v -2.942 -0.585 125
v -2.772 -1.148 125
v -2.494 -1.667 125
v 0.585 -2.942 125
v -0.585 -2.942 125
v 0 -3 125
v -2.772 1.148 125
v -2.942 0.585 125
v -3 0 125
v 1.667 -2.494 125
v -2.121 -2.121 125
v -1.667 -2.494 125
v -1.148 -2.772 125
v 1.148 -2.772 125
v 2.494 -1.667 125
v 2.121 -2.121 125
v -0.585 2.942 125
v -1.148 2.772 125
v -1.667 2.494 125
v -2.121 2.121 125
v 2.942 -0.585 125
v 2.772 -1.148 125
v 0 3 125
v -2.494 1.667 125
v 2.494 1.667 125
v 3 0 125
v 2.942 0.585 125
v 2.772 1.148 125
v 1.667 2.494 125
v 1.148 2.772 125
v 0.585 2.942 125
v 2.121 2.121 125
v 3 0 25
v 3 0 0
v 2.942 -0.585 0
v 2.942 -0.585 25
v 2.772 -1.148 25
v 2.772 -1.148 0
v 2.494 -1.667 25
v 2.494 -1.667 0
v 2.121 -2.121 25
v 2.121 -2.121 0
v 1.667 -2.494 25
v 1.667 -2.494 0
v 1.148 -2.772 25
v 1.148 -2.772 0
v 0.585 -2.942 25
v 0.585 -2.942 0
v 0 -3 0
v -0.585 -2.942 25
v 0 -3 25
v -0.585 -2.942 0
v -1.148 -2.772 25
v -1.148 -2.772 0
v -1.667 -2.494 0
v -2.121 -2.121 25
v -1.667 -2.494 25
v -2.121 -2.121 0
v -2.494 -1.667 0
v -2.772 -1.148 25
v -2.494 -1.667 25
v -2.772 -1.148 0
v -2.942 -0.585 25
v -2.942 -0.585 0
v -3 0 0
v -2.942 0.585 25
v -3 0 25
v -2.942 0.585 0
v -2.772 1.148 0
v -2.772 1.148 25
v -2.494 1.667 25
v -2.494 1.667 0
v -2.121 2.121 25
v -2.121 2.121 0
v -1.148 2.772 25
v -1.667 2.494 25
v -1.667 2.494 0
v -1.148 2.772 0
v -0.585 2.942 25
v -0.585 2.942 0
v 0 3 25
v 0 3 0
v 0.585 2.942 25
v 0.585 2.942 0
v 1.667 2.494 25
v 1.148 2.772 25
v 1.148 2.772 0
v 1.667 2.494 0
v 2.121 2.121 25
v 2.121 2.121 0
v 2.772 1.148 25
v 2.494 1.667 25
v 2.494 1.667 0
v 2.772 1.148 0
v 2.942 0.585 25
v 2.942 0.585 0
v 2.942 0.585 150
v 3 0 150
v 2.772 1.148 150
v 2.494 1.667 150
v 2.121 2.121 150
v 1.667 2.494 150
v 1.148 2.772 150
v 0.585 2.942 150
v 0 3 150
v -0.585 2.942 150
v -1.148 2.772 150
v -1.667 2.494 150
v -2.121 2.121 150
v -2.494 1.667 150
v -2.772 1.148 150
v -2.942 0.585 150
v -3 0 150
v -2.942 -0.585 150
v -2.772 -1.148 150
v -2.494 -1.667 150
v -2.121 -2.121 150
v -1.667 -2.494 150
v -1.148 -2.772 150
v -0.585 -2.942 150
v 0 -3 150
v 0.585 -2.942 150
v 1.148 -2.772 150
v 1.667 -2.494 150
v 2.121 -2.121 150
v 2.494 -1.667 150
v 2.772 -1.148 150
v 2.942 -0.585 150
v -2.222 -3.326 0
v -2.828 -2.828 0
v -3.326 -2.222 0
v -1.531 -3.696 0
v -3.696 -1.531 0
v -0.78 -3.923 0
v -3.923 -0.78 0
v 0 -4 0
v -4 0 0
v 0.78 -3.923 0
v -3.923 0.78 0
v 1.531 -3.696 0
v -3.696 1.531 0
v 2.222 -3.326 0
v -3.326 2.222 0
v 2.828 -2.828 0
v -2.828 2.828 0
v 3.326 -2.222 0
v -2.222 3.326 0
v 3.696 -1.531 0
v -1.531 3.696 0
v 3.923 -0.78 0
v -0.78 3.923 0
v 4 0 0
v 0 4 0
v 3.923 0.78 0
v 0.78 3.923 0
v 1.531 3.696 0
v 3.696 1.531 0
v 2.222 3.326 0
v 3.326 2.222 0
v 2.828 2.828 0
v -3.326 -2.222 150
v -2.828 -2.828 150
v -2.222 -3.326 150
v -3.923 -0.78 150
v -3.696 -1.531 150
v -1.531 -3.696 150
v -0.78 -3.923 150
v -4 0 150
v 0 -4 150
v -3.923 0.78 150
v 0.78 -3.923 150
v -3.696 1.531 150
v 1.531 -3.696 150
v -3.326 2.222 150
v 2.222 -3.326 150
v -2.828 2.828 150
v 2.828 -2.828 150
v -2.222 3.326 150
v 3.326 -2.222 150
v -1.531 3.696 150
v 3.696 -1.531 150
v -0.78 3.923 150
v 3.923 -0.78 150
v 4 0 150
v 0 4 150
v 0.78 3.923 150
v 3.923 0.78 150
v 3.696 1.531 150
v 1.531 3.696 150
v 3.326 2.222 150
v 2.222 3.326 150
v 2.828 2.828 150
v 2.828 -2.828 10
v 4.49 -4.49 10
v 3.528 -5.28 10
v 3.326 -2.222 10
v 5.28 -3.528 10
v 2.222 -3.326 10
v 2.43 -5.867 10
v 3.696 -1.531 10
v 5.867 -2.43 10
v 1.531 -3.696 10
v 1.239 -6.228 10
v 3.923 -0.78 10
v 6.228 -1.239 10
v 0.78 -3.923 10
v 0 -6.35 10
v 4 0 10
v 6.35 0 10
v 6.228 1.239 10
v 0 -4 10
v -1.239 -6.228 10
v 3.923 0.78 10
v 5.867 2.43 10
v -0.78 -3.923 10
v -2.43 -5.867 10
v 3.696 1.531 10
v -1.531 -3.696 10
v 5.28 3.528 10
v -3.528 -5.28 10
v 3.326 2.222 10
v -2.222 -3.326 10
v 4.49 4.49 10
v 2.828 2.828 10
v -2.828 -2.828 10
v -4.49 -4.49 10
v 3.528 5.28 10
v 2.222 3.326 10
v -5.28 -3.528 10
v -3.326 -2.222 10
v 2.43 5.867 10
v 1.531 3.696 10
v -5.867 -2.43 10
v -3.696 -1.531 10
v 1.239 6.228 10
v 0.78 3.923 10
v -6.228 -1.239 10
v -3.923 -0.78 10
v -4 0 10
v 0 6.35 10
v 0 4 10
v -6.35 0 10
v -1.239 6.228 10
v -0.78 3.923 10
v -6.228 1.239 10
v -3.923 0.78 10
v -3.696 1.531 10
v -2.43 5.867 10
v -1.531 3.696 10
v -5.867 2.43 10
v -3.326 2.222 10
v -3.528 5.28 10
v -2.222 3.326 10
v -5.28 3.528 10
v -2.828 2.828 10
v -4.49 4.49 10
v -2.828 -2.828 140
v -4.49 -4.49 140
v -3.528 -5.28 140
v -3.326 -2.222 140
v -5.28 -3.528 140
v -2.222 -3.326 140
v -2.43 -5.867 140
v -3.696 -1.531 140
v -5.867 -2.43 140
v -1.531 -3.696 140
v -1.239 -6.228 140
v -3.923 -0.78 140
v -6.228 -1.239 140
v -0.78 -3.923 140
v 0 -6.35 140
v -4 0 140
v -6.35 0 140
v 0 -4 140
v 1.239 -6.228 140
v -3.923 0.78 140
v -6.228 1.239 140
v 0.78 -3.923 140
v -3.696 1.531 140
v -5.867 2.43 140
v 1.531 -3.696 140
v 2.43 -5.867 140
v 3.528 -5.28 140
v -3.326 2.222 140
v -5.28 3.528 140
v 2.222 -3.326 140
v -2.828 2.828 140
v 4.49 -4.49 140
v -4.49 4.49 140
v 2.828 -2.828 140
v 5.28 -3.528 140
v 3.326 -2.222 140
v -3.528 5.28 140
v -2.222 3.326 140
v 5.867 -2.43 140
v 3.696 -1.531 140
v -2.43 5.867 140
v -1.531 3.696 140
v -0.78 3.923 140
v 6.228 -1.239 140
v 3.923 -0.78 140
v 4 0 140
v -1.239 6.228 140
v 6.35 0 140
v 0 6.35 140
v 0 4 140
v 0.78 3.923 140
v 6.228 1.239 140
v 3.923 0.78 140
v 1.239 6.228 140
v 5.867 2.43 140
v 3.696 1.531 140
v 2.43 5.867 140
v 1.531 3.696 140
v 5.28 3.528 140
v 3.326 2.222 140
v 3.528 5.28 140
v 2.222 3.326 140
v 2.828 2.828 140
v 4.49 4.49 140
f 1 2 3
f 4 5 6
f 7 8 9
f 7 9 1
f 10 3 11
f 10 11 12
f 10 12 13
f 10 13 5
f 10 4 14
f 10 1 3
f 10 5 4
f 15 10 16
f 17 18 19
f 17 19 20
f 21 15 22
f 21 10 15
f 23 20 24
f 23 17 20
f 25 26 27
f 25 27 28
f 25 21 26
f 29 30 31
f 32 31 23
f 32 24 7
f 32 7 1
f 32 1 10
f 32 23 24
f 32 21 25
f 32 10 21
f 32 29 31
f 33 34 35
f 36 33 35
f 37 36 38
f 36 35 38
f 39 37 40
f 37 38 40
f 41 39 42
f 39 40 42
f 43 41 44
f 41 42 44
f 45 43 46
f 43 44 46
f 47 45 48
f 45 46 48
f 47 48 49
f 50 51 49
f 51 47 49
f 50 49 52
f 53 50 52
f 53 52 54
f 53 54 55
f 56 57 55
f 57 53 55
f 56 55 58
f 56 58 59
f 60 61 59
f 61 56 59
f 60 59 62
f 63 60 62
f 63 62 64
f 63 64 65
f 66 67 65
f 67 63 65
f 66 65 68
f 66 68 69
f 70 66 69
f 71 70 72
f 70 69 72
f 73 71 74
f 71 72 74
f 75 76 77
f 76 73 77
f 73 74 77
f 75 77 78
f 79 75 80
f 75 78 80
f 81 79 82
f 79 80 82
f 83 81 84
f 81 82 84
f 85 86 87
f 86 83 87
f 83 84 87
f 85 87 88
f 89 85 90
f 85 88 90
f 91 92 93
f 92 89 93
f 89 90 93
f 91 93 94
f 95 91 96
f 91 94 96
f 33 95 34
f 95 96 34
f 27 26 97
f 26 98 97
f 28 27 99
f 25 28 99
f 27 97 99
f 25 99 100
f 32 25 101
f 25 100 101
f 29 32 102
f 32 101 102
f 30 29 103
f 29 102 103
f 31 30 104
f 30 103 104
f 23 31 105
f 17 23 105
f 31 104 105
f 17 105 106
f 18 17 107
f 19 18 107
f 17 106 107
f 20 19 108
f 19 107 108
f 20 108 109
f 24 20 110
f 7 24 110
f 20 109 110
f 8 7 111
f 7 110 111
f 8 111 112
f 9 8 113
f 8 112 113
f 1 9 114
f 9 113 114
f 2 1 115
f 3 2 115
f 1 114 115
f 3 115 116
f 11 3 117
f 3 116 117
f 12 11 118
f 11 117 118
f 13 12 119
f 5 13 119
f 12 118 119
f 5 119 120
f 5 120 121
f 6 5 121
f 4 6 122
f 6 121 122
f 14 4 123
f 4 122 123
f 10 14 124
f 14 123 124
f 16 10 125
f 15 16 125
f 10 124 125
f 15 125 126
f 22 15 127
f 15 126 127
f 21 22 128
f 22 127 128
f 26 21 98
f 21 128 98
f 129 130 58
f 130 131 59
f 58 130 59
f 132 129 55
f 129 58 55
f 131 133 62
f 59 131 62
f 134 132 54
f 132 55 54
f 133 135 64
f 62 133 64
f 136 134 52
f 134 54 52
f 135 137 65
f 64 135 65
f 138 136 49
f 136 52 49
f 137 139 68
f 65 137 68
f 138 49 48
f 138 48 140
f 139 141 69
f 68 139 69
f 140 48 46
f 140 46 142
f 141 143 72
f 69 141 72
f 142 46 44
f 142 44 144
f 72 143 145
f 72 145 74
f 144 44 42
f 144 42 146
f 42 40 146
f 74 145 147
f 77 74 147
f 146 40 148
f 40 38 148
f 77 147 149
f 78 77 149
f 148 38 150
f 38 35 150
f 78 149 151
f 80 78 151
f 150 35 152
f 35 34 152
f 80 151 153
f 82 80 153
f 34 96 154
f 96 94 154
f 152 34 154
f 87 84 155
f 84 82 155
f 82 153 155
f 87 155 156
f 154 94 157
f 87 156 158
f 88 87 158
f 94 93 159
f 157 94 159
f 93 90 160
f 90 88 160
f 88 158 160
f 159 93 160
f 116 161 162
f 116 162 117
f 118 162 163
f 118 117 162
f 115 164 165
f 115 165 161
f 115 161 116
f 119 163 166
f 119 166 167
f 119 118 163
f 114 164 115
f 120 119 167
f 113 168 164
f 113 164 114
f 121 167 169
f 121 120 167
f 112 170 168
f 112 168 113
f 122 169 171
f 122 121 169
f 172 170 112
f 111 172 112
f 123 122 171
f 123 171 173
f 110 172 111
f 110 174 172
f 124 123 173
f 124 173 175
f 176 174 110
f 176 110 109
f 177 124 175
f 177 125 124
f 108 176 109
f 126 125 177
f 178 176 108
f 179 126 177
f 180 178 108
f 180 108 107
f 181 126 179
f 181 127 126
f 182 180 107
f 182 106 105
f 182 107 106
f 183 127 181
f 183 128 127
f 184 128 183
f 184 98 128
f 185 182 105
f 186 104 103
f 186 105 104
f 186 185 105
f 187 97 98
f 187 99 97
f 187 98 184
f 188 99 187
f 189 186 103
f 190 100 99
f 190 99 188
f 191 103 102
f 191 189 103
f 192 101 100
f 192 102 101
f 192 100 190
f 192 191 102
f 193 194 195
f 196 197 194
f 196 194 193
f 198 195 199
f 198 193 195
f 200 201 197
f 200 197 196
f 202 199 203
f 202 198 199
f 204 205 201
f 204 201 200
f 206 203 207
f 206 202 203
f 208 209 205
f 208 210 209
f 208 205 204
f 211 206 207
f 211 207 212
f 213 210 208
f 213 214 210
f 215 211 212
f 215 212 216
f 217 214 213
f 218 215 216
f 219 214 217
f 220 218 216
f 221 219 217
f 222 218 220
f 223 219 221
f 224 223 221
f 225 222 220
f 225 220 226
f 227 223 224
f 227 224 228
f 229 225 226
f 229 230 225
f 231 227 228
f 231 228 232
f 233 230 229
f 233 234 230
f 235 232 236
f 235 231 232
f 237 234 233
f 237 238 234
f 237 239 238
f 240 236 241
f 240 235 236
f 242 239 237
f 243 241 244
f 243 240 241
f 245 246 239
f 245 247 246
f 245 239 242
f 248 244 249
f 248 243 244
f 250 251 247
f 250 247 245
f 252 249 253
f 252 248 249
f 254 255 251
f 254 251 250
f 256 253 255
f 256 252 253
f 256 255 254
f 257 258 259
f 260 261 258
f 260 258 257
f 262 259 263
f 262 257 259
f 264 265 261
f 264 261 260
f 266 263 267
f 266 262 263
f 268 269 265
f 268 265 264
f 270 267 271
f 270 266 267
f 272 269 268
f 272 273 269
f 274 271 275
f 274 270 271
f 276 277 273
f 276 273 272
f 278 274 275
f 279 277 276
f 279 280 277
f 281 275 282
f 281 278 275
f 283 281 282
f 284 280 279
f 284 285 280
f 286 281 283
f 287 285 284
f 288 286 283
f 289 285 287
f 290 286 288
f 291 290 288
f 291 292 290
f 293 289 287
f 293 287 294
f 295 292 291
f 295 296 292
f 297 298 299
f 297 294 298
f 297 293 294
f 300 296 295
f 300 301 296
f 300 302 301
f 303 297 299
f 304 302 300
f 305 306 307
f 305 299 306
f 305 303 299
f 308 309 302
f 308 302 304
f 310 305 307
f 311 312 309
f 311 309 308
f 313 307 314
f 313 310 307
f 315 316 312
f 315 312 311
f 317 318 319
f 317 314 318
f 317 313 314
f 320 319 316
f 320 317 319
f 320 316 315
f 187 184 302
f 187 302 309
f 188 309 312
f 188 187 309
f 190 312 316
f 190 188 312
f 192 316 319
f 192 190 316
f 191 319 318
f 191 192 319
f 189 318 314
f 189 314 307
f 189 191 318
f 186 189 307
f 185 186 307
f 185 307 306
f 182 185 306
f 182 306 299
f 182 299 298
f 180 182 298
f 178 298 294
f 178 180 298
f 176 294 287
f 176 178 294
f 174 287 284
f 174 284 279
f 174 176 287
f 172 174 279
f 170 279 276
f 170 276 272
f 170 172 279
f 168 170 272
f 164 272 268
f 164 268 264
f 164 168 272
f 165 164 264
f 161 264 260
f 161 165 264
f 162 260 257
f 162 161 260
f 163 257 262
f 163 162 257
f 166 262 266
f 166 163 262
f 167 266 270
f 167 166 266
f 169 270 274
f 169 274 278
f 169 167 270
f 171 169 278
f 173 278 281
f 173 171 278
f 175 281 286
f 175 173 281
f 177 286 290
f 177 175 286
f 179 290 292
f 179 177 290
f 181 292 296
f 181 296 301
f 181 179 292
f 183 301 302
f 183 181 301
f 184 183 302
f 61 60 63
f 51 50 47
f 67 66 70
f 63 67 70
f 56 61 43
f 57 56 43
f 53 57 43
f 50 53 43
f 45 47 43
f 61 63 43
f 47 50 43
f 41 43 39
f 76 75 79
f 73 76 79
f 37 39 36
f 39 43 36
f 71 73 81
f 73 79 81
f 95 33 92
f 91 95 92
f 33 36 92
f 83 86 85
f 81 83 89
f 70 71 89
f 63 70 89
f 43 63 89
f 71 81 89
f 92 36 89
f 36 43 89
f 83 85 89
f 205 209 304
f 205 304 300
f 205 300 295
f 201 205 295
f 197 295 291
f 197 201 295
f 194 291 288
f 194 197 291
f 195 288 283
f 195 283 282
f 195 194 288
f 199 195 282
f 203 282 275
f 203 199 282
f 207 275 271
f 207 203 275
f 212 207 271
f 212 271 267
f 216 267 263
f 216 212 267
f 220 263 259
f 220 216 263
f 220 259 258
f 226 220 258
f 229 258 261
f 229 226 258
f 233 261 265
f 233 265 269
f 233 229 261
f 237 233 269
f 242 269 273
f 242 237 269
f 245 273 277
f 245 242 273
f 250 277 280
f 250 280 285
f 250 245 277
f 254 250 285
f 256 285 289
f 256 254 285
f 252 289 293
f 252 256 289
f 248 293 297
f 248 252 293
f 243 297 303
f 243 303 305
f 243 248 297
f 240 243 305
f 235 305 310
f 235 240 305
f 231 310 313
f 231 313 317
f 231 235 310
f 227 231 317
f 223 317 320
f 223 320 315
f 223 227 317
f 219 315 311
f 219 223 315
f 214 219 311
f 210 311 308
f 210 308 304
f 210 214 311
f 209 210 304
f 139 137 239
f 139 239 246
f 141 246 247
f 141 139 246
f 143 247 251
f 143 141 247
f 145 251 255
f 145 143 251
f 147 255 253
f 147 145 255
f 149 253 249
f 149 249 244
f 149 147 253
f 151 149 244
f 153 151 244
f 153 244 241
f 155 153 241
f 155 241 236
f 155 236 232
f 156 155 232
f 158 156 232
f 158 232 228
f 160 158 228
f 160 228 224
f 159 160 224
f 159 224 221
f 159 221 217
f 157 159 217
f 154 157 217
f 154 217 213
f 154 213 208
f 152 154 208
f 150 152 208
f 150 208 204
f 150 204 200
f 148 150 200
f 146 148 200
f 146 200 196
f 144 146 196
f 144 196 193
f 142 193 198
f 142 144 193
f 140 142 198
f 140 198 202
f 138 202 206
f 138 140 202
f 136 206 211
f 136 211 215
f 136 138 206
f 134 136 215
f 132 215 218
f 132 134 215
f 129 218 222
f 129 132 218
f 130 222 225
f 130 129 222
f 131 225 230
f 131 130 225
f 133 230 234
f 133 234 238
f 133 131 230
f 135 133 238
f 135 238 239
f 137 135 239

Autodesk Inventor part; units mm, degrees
ref_plane "YZ Plane" through (0, 0, 0) normal (1, 0, 0) x (0, 1, 0)
ref_plane "XZ Plane" through (0, 0, 0) normal (0, 1, 0) x (-1, 0, 0)
ref_plane "XY Plane" through (0, 0, 0) normal (0, 0, 1) x (1, 0, 0)
sketch "Sketch1" plane through (0, 0, 0) normal (0, 0, 1) x (1, 0, 0)
  circle A0 centre (0, 0) radius 6.35
  circle A1 centre (0, 0) radius 3
  dimension "d0" = 12.7
  dimension "d1" = 6
extrude "Extrusion1" add sketch "Sketch1" along normal blind 150 contours A0 | A1
sketch "Sketch2" plane through (0, 0, 150) normal (0, 0, 1) x (1, 0, 0)
  circle A0 centre (0, 0) radius 3
  dimension "d4" = 6
extrude "Extrusion2" cut sketch "Sketch2" against normal blind 25
extrude "Extrusion3" cut sketch "Sketch1" along normal blind 25 contours A1
thread "Thread1" size "M6x1" class "6H" standard "ANSI Metric M Profile" length 348
thread "Thread2" size "M6x1" class "6H" standard "ANSI Metric M Profile" length 348
sketch "Boceto3" plane through (0, 0, 150) normal (0, 0, 1) x (1, 0, 0)
  circle A0 centre (0, 0) radius 7
  circle A1 centre (0, 0) radius 4
  dimension "d13" = 8
  dimension "d20" = 14
sketch "Boceto4" plane through (0, 0, 0) normal (0, 0, -1) x (-1, 0, 0)
  circle A0 centre (0, 0) radius 7
  circle A1 centre (0, 0) radius 4
  dimension "d14" = 8
  dimension "d19" = 14
extrude "Extrusión4" cut sketch "Boceto4" against normal blind 10
extrude "Extrusión5" cut sketch "Boceto3" against normal blind 10
properties part number "Guías de Soporte de Motor" material "Steel, High Strength, Low Alloy"
